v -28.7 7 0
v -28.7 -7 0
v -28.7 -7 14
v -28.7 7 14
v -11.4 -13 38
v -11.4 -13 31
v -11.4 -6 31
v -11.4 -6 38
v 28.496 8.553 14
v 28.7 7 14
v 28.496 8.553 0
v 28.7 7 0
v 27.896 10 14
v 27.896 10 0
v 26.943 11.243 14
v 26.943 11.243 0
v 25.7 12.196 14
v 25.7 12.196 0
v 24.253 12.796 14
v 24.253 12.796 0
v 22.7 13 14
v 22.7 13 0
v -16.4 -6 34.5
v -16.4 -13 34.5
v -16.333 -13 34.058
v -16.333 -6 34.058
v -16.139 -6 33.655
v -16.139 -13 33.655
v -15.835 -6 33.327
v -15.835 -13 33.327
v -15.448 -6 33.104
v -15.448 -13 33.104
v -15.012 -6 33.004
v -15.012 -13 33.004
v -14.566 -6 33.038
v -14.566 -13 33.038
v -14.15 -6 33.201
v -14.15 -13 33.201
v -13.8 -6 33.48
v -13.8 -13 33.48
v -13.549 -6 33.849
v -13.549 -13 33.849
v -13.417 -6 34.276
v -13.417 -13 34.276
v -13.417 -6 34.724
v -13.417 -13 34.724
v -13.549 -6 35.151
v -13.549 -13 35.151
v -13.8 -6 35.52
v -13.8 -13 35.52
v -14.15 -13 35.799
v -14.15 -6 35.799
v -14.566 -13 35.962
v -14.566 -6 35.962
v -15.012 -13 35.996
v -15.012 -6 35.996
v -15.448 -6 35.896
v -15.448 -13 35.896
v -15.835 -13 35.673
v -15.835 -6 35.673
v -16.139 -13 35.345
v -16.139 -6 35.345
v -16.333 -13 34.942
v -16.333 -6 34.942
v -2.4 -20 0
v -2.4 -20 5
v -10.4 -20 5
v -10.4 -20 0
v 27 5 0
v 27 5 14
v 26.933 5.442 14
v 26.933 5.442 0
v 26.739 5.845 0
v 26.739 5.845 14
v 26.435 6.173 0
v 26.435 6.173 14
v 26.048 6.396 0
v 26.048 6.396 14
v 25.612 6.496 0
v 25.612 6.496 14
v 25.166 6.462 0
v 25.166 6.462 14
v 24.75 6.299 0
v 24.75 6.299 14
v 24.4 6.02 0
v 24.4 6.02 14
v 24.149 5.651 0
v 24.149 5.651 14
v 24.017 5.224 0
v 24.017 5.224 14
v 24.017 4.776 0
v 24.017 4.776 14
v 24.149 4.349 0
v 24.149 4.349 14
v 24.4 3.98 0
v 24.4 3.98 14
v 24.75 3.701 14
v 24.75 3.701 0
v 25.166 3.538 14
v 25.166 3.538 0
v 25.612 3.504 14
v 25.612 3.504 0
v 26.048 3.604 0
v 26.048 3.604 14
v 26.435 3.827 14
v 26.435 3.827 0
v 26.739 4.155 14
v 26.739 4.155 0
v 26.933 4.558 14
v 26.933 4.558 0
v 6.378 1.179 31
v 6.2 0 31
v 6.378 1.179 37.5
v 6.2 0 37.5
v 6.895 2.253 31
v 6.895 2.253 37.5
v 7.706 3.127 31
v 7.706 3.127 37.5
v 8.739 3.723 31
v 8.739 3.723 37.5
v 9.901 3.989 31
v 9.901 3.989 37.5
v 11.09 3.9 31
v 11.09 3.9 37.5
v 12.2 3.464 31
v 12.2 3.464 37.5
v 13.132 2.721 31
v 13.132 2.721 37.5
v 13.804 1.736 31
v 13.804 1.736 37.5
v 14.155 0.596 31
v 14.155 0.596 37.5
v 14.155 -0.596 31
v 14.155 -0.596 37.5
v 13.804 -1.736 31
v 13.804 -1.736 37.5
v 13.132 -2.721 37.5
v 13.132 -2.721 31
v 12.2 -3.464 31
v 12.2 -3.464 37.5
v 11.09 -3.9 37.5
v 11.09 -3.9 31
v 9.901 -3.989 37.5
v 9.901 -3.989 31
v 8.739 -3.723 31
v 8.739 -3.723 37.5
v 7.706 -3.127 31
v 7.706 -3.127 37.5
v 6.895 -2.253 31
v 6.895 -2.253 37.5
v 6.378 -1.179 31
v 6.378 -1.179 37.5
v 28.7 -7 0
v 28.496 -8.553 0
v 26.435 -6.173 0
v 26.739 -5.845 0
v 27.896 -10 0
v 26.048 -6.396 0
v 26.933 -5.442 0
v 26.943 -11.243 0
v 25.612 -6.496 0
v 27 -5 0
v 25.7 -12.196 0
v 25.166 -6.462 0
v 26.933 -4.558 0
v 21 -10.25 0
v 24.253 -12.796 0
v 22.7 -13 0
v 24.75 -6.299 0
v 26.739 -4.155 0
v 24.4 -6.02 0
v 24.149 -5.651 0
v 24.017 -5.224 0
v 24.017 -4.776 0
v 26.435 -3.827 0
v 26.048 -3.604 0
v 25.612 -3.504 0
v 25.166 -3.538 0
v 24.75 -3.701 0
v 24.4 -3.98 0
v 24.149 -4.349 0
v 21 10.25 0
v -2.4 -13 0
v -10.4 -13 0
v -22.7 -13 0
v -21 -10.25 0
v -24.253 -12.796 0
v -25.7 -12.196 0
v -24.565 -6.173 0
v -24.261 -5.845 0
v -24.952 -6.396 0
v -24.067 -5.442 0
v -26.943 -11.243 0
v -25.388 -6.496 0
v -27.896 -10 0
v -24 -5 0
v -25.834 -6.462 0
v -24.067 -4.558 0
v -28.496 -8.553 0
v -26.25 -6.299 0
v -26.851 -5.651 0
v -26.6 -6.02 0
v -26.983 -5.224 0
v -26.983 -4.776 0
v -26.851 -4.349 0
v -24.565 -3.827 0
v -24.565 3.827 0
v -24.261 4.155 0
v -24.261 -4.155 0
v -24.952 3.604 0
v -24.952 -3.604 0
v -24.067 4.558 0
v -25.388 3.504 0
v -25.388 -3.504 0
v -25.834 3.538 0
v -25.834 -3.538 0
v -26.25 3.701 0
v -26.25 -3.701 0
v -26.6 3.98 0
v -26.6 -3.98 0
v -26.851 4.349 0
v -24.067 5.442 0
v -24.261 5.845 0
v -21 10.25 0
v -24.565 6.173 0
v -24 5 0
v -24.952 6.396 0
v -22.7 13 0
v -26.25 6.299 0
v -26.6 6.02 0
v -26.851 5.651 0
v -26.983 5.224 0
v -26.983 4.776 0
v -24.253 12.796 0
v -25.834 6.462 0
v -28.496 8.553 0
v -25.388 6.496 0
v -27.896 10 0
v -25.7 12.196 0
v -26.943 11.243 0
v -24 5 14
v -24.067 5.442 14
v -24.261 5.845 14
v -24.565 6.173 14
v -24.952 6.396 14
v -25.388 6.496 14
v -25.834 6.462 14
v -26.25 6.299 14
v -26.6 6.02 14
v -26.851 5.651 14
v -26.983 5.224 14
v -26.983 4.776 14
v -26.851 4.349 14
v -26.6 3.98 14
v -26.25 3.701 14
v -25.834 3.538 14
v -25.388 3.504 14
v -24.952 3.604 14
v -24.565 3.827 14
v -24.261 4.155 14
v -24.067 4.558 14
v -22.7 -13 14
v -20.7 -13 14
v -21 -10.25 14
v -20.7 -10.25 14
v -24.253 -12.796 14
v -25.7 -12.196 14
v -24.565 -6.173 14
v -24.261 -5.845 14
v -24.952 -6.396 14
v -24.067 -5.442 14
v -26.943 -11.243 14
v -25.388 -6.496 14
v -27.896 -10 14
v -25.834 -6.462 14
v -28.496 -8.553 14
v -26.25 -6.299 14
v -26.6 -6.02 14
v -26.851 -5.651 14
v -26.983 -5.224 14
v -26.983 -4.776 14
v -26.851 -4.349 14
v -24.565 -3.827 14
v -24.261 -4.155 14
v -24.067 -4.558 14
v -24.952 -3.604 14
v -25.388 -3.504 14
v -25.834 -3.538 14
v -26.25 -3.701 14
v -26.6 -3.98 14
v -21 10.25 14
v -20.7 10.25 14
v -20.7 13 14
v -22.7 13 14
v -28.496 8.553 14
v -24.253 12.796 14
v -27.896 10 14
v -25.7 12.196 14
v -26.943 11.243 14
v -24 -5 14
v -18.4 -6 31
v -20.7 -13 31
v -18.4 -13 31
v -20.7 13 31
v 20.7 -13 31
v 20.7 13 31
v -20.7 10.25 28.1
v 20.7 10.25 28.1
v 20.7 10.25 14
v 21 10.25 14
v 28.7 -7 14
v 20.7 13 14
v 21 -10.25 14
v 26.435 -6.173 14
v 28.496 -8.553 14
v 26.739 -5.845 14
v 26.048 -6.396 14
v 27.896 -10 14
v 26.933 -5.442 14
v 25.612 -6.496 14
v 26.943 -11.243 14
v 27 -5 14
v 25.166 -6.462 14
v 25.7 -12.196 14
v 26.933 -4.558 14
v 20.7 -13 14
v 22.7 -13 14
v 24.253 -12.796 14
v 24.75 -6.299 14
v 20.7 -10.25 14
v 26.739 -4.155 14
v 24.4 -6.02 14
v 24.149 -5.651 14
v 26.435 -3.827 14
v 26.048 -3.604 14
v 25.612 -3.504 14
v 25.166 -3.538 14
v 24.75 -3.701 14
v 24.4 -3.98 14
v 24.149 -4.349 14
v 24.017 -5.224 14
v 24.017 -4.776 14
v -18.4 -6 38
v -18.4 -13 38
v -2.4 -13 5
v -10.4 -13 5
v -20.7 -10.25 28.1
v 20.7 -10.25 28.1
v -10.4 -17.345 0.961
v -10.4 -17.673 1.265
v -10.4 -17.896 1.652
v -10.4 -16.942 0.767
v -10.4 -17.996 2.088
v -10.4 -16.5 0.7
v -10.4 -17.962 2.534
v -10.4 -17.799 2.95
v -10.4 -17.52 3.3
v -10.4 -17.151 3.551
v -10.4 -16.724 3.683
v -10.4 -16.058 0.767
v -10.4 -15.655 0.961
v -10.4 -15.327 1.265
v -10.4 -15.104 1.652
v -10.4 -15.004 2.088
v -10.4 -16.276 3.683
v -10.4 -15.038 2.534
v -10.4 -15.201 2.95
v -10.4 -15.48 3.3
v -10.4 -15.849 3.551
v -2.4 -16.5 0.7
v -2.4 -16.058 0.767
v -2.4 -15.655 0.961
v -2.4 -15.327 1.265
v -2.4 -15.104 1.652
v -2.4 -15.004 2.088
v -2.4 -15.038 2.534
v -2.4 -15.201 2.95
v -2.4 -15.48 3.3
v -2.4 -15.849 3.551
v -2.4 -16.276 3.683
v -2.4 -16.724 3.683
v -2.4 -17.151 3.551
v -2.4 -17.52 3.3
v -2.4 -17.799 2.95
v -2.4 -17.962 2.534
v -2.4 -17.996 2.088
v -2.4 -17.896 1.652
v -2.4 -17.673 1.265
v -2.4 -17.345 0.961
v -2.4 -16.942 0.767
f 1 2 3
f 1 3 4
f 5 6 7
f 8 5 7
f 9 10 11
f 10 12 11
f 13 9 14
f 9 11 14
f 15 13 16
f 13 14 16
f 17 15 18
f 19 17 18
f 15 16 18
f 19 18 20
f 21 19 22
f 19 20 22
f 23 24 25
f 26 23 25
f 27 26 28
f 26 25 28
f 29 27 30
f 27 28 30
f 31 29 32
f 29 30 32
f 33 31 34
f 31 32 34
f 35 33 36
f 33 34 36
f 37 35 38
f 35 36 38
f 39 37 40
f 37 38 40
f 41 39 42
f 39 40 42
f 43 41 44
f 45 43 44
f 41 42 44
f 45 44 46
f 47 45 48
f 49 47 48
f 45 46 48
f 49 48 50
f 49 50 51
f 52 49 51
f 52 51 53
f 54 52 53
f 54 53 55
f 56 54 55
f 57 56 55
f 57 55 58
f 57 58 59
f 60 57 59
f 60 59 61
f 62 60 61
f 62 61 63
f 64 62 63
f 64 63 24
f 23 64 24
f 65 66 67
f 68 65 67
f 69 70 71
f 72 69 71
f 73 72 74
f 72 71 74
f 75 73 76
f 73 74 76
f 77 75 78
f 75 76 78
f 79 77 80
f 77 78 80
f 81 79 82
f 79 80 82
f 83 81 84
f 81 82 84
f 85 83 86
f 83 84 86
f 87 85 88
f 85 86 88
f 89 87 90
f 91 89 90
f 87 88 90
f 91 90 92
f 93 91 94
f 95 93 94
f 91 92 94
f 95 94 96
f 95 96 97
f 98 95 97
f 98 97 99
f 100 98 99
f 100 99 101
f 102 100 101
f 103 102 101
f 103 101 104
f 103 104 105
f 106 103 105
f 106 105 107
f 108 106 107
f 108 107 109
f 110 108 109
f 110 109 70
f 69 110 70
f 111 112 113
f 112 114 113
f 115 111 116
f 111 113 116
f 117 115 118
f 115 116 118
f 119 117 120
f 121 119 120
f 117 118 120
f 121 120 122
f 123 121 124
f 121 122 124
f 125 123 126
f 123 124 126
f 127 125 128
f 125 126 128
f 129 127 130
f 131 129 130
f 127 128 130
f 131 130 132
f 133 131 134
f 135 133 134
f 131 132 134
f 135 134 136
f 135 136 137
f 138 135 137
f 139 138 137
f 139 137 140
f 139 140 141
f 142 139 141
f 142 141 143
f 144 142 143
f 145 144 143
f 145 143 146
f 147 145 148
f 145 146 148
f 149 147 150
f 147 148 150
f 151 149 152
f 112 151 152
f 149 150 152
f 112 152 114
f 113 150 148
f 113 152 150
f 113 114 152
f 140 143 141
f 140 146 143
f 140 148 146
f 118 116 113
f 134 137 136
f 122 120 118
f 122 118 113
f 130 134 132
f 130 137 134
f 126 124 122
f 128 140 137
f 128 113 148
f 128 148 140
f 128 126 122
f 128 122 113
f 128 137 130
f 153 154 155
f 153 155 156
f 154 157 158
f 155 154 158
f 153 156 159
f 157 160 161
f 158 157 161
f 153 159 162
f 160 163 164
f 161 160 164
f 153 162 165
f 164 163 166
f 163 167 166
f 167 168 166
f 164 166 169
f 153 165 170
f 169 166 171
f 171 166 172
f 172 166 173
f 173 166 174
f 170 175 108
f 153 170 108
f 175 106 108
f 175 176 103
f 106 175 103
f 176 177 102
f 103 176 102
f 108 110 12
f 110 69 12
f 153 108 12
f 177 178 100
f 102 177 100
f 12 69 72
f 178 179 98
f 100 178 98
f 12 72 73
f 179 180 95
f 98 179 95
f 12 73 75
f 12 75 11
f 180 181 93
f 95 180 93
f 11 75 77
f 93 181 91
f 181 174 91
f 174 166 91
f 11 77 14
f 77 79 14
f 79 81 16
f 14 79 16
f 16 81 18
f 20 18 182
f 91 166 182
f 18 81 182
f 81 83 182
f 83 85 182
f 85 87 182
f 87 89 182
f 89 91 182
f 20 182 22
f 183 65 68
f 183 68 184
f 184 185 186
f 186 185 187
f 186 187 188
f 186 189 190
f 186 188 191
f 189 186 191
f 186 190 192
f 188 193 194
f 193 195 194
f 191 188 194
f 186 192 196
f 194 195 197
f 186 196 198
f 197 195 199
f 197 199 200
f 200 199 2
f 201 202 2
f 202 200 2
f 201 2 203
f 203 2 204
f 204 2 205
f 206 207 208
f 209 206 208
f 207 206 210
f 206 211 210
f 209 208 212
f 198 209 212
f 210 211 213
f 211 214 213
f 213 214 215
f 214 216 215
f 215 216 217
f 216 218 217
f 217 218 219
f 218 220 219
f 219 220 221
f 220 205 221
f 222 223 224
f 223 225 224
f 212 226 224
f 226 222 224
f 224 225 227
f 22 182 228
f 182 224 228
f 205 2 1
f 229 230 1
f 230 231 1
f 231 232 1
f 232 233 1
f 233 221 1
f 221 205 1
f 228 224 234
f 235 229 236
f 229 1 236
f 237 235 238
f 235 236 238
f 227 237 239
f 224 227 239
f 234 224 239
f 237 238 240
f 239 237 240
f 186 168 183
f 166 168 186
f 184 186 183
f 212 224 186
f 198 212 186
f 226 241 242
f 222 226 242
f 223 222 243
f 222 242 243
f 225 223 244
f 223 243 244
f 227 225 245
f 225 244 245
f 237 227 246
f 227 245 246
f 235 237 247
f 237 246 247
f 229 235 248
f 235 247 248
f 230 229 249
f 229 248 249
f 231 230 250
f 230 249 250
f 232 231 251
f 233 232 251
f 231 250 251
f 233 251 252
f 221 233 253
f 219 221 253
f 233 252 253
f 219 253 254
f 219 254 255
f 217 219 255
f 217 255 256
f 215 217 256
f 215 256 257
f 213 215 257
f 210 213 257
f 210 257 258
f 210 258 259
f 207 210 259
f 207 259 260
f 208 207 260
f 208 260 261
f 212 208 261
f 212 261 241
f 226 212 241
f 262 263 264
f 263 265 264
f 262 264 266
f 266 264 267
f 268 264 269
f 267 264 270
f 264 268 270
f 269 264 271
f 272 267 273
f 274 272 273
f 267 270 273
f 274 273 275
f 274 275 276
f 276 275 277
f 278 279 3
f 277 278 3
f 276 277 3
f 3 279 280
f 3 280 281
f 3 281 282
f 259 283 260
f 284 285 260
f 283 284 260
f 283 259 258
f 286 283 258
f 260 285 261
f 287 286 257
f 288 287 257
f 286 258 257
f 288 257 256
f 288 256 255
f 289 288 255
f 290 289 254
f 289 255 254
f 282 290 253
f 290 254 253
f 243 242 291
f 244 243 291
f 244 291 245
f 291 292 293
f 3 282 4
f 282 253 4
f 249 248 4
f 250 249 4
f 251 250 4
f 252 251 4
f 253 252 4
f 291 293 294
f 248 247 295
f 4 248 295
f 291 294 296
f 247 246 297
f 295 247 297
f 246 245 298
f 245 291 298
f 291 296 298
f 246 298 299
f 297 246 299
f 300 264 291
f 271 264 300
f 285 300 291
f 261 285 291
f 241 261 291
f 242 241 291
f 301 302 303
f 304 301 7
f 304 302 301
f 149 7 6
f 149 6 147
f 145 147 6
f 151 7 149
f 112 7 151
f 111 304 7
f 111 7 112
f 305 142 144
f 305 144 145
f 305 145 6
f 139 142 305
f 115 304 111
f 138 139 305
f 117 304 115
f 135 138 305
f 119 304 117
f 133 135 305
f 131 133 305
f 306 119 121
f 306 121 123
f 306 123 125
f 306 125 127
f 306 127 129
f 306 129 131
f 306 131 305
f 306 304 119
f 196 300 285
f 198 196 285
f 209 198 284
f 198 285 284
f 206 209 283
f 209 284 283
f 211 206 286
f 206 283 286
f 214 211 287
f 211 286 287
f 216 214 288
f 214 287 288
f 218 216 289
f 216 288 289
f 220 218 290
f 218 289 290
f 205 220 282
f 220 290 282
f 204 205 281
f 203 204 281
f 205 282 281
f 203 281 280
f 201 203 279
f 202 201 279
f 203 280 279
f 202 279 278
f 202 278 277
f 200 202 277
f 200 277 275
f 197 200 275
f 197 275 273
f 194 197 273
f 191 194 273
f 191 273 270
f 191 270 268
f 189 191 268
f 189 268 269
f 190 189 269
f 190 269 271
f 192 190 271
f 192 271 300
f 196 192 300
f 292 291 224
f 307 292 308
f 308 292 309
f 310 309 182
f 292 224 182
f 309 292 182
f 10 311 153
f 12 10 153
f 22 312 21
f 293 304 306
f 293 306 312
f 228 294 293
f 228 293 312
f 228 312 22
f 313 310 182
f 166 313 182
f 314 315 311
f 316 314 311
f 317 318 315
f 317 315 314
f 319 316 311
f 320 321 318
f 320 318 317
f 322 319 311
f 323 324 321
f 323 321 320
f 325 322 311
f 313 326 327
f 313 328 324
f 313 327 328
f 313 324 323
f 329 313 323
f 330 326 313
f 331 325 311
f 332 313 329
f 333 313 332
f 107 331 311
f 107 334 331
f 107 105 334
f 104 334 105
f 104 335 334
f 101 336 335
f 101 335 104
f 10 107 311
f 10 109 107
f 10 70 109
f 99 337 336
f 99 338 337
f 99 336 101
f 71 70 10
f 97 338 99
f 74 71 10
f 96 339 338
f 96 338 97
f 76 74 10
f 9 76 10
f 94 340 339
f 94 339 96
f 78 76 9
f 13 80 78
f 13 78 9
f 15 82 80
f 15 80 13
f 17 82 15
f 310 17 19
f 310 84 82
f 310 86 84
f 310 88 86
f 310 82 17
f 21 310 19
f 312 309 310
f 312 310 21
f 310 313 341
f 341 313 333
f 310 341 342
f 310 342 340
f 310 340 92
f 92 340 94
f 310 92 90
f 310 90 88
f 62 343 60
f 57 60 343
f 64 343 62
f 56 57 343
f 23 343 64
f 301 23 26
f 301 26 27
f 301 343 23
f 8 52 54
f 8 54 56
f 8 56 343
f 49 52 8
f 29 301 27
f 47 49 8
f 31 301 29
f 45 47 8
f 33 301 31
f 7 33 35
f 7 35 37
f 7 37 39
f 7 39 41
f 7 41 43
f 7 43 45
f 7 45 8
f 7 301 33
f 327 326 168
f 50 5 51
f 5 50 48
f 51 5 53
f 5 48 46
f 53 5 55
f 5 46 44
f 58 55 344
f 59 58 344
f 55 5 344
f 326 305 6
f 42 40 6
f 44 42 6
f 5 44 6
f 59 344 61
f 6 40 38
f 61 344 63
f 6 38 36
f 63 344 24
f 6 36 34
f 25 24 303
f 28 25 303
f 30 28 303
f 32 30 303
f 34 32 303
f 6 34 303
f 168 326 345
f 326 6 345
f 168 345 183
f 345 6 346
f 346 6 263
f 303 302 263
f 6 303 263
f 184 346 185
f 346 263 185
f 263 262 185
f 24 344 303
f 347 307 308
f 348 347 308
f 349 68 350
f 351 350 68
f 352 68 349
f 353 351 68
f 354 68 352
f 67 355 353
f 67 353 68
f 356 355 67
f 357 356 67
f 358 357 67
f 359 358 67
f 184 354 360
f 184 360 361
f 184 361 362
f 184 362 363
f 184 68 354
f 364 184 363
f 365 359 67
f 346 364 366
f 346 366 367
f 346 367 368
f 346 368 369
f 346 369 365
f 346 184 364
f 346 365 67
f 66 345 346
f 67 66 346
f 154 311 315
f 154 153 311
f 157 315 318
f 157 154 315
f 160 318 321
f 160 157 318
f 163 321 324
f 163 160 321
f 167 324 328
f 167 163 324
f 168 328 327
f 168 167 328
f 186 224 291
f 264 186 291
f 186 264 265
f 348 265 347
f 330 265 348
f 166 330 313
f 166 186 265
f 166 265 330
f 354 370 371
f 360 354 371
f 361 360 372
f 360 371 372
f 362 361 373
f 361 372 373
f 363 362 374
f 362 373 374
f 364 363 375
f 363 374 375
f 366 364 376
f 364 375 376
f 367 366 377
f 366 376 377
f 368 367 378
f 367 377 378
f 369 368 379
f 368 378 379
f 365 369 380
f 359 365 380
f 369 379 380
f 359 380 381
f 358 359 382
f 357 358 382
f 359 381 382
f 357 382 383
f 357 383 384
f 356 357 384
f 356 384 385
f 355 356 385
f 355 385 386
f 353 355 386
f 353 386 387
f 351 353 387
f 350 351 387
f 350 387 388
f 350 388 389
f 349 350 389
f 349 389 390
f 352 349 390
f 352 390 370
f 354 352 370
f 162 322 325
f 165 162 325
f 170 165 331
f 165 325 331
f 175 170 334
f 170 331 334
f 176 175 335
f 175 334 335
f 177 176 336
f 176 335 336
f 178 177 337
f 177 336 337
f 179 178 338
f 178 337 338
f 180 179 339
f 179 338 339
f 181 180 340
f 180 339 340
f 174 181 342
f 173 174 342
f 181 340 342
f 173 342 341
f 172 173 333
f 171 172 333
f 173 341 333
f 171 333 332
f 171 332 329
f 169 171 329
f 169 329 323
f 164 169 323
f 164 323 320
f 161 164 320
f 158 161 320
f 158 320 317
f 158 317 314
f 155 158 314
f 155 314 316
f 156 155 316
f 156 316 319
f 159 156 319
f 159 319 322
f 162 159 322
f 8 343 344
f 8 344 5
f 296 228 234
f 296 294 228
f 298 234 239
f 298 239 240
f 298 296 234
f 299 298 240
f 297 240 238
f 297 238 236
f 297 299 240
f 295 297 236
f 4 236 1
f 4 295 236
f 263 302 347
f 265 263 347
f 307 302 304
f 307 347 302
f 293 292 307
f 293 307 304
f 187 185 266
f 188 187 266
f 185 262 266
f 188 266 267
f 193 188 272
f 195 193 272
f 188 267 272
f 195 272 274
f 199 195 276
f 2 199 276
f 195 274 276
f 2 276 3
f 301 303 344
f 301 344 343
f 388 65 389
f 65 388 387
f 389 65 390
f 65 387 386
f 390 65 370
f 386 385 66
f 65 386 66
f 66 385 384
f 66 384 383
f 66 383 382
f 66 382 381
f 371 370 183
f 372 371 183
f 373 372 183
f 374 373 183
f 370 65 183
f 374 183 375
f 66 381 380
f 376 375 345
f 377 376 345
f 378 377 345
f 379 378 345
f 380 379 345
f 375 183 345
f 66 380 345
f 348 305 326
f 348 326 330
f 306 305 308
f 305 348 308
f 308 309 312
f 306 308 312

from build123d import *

# Parameters (mm, degrees)
SKETCH1_W                    = 49.7
SKETCH1_H                    = 26
BOSS_EXTRUDE1_DEPTH          = 14
SKETCH2_W                    = 41.4
SKETCH2_H                    = 26
BOSS_EXTRUDE2_DEPTH          = 17
CUT_EXTRUDE1_DEPTH           = 20.5
SKETCH4_W                    = 14
SKETCH4_H                    = 26
BOSS_EXTRUDE3_DEPTH          = 7.7
BOSS_EXTRUDE5_START          = -26
SKETCH6_W                    = 8
SKETCH6_H                    = 5
BOSS_EXTRUDE5_DEPTH          = 7
SKETCH5_W                    = 7
SKETCH5_H                    = 7
BOSS_EXTRUDE6_DEPTH          = 7
SKETCH7_W                    = 4
SKETCH7_H                    = 6.5
F_3_0_3_DIAMETER_HOLE1_D     = 3
F_3_0_3_DIAMETER_HOLE1_DEPTH = 38
F_3_0_3_DIAMETER_HOLE2_D     = 3
F_3_0_3_DIAMETER_HOLE2_DEPTH = 39.1
F_3_0_3_DIAMETER_HOLE3_D     = 3
F_3_0_3_DIAMETER_HOLE3_DEPTH = 33
FILLET1_R                    = 6


with BuildPart() as part:
    # Sketch1 → Boss-Extrude1 (new body)
    with BuildSketch(Plane(origin=(0, 0, 0), x_dir=(-1, 0, 0), z_dir=(0, 0, -1))):
        with Locations((3.85, 0)):
            Rectangle(SKETCH1_W, SKETCH1_H)
    extrude(amount=-BOSS_EXTRUDE1_DEPTH)

    # Sketch2 → Boss-Extrude2 (add)
    with BuildSketch(Plane.XY.offset(14)):
        Rectangle(SKETCH2_W, SKETCH2_H)
    extrude(amount=BOSS_EXTRUDE2_DEPTH)

    # Sketch3 → Cut-Extrude1 (cut)
    with BuildSketch(Plane(origin=(0, 10.25, 0), x_dir=(1, 0, 0), z_dir=(0, 1, 0))):
        Polygon((20.7, -14), (21, -14), (21, 0), (-21, 0), (-21, -14), (-20.7, -14), (-20.7, -28.1), (20.7, -28.1), align=None)
    extrude(amount=-CUT_EXTRUDE1_DEPTH, mode=Mode.SUBTRACT)

    # Sketch4 → Boss-Extrude3 (add)
    with BuildSketch(Plane(origin=(21, 0, 0), x_dir=(0, 0, -1), z_dir=(1, 0, 0))):
        with Locations((-7, 0)):
            Rectangle(SKETCH4_W, SKETCH4_H)
    extrude(amount=BOSS_EXTRUDE3_DEPTH)

    # Sketch6 → Boss-Extrude5 (add)
    with BuildSketch(Plane(origin=(0, 13, 0), x_dir=(-1, 0, 0), z_dir=(0, 1, 0)).offset(BOSS_EXTRUDE5_START)):
        with Locations((6.4, 2.5)):
            Rectangle(SKETCH6_W, SKETCH6_H)
    extrude(amount=-BOSS_EXTRUDE5_DEPTH)

    # Sketch5 → Boss-Extrude6 (add)
    with BuildSketch(Plane.XY.offset(31)):
        with Locations((-14.9, -9.5)):
            Rectangle(SKETCH5_W, SKETCH5_H)
    extrude(amount=BOSS_EXTRUDE6_DEPTH)

    # Sketch7 → Revolve1 (revolve)
    with BuildSketch(Plane.XZ, mode=Mode.PRIVATE) as revolve1_sk:
        with Locations((12.2, 34.25)):
            Rectangle(SKETCH7_W, SKETCH7_H)
    revolve(revolve1_sk.sketch.rotate(Axis((10.2, 0, 37.5), (0, 0, -1)), 180), axis=Axis((10.2, 0, 37.5), (0, 0, -1)))

    # Ø3.0 (3) Diameter Hole1
    with Locations(Plane(origin=(0, 0, 0), x_dir=(-1, 0, 0), z_dir=(0, 0, -1))):
        with Locations((-25.5, -5), (-25.5, 5), (25.5, -5), (25.5, 5)):
            Hole(F_3_0_3_DIAMETER_HOLE1_D / 2, depth=F_3_0_3_DIAMETER_HOLE1_DEPTH)

    # Ø3.0 (3) Diameter Hole2
    with Locations(Plane.ZY.offset(10.4)):
        with Locations((2.2, -16.5)):
            Hole(F_3_0_3_DIAMETER_HOLE2_D / 2, depth=F_3_0_3_DIAMETER_HOLE2_DEPTH)

    # Ø3.0 (3) Diameter Hole3
    with Locations(Plane(origin=(0, 13, 0), x_dir=(1, 0, 0), z_dir=(0, 1, 0))):
        with Locations((-14.9, -34.5)):
            Hole(F_3_0_3_DIAMETER_HOLE3_D / 2, depth=F_3_0_3_DIAMETER_HOLE3_DEPTH)

    # Fillet1
    fillet1_edges = [part.edges().sort_by_distance(p)[0] for p in [
        (28.7, -13, 7),
        (28.7, 13, 7),
        (-28.7, 13, 7),
        (-28.7, -13, 7),
    ]]
    fillet(fillet1_edges, radius=FILLET1_R)


solid = part.part
